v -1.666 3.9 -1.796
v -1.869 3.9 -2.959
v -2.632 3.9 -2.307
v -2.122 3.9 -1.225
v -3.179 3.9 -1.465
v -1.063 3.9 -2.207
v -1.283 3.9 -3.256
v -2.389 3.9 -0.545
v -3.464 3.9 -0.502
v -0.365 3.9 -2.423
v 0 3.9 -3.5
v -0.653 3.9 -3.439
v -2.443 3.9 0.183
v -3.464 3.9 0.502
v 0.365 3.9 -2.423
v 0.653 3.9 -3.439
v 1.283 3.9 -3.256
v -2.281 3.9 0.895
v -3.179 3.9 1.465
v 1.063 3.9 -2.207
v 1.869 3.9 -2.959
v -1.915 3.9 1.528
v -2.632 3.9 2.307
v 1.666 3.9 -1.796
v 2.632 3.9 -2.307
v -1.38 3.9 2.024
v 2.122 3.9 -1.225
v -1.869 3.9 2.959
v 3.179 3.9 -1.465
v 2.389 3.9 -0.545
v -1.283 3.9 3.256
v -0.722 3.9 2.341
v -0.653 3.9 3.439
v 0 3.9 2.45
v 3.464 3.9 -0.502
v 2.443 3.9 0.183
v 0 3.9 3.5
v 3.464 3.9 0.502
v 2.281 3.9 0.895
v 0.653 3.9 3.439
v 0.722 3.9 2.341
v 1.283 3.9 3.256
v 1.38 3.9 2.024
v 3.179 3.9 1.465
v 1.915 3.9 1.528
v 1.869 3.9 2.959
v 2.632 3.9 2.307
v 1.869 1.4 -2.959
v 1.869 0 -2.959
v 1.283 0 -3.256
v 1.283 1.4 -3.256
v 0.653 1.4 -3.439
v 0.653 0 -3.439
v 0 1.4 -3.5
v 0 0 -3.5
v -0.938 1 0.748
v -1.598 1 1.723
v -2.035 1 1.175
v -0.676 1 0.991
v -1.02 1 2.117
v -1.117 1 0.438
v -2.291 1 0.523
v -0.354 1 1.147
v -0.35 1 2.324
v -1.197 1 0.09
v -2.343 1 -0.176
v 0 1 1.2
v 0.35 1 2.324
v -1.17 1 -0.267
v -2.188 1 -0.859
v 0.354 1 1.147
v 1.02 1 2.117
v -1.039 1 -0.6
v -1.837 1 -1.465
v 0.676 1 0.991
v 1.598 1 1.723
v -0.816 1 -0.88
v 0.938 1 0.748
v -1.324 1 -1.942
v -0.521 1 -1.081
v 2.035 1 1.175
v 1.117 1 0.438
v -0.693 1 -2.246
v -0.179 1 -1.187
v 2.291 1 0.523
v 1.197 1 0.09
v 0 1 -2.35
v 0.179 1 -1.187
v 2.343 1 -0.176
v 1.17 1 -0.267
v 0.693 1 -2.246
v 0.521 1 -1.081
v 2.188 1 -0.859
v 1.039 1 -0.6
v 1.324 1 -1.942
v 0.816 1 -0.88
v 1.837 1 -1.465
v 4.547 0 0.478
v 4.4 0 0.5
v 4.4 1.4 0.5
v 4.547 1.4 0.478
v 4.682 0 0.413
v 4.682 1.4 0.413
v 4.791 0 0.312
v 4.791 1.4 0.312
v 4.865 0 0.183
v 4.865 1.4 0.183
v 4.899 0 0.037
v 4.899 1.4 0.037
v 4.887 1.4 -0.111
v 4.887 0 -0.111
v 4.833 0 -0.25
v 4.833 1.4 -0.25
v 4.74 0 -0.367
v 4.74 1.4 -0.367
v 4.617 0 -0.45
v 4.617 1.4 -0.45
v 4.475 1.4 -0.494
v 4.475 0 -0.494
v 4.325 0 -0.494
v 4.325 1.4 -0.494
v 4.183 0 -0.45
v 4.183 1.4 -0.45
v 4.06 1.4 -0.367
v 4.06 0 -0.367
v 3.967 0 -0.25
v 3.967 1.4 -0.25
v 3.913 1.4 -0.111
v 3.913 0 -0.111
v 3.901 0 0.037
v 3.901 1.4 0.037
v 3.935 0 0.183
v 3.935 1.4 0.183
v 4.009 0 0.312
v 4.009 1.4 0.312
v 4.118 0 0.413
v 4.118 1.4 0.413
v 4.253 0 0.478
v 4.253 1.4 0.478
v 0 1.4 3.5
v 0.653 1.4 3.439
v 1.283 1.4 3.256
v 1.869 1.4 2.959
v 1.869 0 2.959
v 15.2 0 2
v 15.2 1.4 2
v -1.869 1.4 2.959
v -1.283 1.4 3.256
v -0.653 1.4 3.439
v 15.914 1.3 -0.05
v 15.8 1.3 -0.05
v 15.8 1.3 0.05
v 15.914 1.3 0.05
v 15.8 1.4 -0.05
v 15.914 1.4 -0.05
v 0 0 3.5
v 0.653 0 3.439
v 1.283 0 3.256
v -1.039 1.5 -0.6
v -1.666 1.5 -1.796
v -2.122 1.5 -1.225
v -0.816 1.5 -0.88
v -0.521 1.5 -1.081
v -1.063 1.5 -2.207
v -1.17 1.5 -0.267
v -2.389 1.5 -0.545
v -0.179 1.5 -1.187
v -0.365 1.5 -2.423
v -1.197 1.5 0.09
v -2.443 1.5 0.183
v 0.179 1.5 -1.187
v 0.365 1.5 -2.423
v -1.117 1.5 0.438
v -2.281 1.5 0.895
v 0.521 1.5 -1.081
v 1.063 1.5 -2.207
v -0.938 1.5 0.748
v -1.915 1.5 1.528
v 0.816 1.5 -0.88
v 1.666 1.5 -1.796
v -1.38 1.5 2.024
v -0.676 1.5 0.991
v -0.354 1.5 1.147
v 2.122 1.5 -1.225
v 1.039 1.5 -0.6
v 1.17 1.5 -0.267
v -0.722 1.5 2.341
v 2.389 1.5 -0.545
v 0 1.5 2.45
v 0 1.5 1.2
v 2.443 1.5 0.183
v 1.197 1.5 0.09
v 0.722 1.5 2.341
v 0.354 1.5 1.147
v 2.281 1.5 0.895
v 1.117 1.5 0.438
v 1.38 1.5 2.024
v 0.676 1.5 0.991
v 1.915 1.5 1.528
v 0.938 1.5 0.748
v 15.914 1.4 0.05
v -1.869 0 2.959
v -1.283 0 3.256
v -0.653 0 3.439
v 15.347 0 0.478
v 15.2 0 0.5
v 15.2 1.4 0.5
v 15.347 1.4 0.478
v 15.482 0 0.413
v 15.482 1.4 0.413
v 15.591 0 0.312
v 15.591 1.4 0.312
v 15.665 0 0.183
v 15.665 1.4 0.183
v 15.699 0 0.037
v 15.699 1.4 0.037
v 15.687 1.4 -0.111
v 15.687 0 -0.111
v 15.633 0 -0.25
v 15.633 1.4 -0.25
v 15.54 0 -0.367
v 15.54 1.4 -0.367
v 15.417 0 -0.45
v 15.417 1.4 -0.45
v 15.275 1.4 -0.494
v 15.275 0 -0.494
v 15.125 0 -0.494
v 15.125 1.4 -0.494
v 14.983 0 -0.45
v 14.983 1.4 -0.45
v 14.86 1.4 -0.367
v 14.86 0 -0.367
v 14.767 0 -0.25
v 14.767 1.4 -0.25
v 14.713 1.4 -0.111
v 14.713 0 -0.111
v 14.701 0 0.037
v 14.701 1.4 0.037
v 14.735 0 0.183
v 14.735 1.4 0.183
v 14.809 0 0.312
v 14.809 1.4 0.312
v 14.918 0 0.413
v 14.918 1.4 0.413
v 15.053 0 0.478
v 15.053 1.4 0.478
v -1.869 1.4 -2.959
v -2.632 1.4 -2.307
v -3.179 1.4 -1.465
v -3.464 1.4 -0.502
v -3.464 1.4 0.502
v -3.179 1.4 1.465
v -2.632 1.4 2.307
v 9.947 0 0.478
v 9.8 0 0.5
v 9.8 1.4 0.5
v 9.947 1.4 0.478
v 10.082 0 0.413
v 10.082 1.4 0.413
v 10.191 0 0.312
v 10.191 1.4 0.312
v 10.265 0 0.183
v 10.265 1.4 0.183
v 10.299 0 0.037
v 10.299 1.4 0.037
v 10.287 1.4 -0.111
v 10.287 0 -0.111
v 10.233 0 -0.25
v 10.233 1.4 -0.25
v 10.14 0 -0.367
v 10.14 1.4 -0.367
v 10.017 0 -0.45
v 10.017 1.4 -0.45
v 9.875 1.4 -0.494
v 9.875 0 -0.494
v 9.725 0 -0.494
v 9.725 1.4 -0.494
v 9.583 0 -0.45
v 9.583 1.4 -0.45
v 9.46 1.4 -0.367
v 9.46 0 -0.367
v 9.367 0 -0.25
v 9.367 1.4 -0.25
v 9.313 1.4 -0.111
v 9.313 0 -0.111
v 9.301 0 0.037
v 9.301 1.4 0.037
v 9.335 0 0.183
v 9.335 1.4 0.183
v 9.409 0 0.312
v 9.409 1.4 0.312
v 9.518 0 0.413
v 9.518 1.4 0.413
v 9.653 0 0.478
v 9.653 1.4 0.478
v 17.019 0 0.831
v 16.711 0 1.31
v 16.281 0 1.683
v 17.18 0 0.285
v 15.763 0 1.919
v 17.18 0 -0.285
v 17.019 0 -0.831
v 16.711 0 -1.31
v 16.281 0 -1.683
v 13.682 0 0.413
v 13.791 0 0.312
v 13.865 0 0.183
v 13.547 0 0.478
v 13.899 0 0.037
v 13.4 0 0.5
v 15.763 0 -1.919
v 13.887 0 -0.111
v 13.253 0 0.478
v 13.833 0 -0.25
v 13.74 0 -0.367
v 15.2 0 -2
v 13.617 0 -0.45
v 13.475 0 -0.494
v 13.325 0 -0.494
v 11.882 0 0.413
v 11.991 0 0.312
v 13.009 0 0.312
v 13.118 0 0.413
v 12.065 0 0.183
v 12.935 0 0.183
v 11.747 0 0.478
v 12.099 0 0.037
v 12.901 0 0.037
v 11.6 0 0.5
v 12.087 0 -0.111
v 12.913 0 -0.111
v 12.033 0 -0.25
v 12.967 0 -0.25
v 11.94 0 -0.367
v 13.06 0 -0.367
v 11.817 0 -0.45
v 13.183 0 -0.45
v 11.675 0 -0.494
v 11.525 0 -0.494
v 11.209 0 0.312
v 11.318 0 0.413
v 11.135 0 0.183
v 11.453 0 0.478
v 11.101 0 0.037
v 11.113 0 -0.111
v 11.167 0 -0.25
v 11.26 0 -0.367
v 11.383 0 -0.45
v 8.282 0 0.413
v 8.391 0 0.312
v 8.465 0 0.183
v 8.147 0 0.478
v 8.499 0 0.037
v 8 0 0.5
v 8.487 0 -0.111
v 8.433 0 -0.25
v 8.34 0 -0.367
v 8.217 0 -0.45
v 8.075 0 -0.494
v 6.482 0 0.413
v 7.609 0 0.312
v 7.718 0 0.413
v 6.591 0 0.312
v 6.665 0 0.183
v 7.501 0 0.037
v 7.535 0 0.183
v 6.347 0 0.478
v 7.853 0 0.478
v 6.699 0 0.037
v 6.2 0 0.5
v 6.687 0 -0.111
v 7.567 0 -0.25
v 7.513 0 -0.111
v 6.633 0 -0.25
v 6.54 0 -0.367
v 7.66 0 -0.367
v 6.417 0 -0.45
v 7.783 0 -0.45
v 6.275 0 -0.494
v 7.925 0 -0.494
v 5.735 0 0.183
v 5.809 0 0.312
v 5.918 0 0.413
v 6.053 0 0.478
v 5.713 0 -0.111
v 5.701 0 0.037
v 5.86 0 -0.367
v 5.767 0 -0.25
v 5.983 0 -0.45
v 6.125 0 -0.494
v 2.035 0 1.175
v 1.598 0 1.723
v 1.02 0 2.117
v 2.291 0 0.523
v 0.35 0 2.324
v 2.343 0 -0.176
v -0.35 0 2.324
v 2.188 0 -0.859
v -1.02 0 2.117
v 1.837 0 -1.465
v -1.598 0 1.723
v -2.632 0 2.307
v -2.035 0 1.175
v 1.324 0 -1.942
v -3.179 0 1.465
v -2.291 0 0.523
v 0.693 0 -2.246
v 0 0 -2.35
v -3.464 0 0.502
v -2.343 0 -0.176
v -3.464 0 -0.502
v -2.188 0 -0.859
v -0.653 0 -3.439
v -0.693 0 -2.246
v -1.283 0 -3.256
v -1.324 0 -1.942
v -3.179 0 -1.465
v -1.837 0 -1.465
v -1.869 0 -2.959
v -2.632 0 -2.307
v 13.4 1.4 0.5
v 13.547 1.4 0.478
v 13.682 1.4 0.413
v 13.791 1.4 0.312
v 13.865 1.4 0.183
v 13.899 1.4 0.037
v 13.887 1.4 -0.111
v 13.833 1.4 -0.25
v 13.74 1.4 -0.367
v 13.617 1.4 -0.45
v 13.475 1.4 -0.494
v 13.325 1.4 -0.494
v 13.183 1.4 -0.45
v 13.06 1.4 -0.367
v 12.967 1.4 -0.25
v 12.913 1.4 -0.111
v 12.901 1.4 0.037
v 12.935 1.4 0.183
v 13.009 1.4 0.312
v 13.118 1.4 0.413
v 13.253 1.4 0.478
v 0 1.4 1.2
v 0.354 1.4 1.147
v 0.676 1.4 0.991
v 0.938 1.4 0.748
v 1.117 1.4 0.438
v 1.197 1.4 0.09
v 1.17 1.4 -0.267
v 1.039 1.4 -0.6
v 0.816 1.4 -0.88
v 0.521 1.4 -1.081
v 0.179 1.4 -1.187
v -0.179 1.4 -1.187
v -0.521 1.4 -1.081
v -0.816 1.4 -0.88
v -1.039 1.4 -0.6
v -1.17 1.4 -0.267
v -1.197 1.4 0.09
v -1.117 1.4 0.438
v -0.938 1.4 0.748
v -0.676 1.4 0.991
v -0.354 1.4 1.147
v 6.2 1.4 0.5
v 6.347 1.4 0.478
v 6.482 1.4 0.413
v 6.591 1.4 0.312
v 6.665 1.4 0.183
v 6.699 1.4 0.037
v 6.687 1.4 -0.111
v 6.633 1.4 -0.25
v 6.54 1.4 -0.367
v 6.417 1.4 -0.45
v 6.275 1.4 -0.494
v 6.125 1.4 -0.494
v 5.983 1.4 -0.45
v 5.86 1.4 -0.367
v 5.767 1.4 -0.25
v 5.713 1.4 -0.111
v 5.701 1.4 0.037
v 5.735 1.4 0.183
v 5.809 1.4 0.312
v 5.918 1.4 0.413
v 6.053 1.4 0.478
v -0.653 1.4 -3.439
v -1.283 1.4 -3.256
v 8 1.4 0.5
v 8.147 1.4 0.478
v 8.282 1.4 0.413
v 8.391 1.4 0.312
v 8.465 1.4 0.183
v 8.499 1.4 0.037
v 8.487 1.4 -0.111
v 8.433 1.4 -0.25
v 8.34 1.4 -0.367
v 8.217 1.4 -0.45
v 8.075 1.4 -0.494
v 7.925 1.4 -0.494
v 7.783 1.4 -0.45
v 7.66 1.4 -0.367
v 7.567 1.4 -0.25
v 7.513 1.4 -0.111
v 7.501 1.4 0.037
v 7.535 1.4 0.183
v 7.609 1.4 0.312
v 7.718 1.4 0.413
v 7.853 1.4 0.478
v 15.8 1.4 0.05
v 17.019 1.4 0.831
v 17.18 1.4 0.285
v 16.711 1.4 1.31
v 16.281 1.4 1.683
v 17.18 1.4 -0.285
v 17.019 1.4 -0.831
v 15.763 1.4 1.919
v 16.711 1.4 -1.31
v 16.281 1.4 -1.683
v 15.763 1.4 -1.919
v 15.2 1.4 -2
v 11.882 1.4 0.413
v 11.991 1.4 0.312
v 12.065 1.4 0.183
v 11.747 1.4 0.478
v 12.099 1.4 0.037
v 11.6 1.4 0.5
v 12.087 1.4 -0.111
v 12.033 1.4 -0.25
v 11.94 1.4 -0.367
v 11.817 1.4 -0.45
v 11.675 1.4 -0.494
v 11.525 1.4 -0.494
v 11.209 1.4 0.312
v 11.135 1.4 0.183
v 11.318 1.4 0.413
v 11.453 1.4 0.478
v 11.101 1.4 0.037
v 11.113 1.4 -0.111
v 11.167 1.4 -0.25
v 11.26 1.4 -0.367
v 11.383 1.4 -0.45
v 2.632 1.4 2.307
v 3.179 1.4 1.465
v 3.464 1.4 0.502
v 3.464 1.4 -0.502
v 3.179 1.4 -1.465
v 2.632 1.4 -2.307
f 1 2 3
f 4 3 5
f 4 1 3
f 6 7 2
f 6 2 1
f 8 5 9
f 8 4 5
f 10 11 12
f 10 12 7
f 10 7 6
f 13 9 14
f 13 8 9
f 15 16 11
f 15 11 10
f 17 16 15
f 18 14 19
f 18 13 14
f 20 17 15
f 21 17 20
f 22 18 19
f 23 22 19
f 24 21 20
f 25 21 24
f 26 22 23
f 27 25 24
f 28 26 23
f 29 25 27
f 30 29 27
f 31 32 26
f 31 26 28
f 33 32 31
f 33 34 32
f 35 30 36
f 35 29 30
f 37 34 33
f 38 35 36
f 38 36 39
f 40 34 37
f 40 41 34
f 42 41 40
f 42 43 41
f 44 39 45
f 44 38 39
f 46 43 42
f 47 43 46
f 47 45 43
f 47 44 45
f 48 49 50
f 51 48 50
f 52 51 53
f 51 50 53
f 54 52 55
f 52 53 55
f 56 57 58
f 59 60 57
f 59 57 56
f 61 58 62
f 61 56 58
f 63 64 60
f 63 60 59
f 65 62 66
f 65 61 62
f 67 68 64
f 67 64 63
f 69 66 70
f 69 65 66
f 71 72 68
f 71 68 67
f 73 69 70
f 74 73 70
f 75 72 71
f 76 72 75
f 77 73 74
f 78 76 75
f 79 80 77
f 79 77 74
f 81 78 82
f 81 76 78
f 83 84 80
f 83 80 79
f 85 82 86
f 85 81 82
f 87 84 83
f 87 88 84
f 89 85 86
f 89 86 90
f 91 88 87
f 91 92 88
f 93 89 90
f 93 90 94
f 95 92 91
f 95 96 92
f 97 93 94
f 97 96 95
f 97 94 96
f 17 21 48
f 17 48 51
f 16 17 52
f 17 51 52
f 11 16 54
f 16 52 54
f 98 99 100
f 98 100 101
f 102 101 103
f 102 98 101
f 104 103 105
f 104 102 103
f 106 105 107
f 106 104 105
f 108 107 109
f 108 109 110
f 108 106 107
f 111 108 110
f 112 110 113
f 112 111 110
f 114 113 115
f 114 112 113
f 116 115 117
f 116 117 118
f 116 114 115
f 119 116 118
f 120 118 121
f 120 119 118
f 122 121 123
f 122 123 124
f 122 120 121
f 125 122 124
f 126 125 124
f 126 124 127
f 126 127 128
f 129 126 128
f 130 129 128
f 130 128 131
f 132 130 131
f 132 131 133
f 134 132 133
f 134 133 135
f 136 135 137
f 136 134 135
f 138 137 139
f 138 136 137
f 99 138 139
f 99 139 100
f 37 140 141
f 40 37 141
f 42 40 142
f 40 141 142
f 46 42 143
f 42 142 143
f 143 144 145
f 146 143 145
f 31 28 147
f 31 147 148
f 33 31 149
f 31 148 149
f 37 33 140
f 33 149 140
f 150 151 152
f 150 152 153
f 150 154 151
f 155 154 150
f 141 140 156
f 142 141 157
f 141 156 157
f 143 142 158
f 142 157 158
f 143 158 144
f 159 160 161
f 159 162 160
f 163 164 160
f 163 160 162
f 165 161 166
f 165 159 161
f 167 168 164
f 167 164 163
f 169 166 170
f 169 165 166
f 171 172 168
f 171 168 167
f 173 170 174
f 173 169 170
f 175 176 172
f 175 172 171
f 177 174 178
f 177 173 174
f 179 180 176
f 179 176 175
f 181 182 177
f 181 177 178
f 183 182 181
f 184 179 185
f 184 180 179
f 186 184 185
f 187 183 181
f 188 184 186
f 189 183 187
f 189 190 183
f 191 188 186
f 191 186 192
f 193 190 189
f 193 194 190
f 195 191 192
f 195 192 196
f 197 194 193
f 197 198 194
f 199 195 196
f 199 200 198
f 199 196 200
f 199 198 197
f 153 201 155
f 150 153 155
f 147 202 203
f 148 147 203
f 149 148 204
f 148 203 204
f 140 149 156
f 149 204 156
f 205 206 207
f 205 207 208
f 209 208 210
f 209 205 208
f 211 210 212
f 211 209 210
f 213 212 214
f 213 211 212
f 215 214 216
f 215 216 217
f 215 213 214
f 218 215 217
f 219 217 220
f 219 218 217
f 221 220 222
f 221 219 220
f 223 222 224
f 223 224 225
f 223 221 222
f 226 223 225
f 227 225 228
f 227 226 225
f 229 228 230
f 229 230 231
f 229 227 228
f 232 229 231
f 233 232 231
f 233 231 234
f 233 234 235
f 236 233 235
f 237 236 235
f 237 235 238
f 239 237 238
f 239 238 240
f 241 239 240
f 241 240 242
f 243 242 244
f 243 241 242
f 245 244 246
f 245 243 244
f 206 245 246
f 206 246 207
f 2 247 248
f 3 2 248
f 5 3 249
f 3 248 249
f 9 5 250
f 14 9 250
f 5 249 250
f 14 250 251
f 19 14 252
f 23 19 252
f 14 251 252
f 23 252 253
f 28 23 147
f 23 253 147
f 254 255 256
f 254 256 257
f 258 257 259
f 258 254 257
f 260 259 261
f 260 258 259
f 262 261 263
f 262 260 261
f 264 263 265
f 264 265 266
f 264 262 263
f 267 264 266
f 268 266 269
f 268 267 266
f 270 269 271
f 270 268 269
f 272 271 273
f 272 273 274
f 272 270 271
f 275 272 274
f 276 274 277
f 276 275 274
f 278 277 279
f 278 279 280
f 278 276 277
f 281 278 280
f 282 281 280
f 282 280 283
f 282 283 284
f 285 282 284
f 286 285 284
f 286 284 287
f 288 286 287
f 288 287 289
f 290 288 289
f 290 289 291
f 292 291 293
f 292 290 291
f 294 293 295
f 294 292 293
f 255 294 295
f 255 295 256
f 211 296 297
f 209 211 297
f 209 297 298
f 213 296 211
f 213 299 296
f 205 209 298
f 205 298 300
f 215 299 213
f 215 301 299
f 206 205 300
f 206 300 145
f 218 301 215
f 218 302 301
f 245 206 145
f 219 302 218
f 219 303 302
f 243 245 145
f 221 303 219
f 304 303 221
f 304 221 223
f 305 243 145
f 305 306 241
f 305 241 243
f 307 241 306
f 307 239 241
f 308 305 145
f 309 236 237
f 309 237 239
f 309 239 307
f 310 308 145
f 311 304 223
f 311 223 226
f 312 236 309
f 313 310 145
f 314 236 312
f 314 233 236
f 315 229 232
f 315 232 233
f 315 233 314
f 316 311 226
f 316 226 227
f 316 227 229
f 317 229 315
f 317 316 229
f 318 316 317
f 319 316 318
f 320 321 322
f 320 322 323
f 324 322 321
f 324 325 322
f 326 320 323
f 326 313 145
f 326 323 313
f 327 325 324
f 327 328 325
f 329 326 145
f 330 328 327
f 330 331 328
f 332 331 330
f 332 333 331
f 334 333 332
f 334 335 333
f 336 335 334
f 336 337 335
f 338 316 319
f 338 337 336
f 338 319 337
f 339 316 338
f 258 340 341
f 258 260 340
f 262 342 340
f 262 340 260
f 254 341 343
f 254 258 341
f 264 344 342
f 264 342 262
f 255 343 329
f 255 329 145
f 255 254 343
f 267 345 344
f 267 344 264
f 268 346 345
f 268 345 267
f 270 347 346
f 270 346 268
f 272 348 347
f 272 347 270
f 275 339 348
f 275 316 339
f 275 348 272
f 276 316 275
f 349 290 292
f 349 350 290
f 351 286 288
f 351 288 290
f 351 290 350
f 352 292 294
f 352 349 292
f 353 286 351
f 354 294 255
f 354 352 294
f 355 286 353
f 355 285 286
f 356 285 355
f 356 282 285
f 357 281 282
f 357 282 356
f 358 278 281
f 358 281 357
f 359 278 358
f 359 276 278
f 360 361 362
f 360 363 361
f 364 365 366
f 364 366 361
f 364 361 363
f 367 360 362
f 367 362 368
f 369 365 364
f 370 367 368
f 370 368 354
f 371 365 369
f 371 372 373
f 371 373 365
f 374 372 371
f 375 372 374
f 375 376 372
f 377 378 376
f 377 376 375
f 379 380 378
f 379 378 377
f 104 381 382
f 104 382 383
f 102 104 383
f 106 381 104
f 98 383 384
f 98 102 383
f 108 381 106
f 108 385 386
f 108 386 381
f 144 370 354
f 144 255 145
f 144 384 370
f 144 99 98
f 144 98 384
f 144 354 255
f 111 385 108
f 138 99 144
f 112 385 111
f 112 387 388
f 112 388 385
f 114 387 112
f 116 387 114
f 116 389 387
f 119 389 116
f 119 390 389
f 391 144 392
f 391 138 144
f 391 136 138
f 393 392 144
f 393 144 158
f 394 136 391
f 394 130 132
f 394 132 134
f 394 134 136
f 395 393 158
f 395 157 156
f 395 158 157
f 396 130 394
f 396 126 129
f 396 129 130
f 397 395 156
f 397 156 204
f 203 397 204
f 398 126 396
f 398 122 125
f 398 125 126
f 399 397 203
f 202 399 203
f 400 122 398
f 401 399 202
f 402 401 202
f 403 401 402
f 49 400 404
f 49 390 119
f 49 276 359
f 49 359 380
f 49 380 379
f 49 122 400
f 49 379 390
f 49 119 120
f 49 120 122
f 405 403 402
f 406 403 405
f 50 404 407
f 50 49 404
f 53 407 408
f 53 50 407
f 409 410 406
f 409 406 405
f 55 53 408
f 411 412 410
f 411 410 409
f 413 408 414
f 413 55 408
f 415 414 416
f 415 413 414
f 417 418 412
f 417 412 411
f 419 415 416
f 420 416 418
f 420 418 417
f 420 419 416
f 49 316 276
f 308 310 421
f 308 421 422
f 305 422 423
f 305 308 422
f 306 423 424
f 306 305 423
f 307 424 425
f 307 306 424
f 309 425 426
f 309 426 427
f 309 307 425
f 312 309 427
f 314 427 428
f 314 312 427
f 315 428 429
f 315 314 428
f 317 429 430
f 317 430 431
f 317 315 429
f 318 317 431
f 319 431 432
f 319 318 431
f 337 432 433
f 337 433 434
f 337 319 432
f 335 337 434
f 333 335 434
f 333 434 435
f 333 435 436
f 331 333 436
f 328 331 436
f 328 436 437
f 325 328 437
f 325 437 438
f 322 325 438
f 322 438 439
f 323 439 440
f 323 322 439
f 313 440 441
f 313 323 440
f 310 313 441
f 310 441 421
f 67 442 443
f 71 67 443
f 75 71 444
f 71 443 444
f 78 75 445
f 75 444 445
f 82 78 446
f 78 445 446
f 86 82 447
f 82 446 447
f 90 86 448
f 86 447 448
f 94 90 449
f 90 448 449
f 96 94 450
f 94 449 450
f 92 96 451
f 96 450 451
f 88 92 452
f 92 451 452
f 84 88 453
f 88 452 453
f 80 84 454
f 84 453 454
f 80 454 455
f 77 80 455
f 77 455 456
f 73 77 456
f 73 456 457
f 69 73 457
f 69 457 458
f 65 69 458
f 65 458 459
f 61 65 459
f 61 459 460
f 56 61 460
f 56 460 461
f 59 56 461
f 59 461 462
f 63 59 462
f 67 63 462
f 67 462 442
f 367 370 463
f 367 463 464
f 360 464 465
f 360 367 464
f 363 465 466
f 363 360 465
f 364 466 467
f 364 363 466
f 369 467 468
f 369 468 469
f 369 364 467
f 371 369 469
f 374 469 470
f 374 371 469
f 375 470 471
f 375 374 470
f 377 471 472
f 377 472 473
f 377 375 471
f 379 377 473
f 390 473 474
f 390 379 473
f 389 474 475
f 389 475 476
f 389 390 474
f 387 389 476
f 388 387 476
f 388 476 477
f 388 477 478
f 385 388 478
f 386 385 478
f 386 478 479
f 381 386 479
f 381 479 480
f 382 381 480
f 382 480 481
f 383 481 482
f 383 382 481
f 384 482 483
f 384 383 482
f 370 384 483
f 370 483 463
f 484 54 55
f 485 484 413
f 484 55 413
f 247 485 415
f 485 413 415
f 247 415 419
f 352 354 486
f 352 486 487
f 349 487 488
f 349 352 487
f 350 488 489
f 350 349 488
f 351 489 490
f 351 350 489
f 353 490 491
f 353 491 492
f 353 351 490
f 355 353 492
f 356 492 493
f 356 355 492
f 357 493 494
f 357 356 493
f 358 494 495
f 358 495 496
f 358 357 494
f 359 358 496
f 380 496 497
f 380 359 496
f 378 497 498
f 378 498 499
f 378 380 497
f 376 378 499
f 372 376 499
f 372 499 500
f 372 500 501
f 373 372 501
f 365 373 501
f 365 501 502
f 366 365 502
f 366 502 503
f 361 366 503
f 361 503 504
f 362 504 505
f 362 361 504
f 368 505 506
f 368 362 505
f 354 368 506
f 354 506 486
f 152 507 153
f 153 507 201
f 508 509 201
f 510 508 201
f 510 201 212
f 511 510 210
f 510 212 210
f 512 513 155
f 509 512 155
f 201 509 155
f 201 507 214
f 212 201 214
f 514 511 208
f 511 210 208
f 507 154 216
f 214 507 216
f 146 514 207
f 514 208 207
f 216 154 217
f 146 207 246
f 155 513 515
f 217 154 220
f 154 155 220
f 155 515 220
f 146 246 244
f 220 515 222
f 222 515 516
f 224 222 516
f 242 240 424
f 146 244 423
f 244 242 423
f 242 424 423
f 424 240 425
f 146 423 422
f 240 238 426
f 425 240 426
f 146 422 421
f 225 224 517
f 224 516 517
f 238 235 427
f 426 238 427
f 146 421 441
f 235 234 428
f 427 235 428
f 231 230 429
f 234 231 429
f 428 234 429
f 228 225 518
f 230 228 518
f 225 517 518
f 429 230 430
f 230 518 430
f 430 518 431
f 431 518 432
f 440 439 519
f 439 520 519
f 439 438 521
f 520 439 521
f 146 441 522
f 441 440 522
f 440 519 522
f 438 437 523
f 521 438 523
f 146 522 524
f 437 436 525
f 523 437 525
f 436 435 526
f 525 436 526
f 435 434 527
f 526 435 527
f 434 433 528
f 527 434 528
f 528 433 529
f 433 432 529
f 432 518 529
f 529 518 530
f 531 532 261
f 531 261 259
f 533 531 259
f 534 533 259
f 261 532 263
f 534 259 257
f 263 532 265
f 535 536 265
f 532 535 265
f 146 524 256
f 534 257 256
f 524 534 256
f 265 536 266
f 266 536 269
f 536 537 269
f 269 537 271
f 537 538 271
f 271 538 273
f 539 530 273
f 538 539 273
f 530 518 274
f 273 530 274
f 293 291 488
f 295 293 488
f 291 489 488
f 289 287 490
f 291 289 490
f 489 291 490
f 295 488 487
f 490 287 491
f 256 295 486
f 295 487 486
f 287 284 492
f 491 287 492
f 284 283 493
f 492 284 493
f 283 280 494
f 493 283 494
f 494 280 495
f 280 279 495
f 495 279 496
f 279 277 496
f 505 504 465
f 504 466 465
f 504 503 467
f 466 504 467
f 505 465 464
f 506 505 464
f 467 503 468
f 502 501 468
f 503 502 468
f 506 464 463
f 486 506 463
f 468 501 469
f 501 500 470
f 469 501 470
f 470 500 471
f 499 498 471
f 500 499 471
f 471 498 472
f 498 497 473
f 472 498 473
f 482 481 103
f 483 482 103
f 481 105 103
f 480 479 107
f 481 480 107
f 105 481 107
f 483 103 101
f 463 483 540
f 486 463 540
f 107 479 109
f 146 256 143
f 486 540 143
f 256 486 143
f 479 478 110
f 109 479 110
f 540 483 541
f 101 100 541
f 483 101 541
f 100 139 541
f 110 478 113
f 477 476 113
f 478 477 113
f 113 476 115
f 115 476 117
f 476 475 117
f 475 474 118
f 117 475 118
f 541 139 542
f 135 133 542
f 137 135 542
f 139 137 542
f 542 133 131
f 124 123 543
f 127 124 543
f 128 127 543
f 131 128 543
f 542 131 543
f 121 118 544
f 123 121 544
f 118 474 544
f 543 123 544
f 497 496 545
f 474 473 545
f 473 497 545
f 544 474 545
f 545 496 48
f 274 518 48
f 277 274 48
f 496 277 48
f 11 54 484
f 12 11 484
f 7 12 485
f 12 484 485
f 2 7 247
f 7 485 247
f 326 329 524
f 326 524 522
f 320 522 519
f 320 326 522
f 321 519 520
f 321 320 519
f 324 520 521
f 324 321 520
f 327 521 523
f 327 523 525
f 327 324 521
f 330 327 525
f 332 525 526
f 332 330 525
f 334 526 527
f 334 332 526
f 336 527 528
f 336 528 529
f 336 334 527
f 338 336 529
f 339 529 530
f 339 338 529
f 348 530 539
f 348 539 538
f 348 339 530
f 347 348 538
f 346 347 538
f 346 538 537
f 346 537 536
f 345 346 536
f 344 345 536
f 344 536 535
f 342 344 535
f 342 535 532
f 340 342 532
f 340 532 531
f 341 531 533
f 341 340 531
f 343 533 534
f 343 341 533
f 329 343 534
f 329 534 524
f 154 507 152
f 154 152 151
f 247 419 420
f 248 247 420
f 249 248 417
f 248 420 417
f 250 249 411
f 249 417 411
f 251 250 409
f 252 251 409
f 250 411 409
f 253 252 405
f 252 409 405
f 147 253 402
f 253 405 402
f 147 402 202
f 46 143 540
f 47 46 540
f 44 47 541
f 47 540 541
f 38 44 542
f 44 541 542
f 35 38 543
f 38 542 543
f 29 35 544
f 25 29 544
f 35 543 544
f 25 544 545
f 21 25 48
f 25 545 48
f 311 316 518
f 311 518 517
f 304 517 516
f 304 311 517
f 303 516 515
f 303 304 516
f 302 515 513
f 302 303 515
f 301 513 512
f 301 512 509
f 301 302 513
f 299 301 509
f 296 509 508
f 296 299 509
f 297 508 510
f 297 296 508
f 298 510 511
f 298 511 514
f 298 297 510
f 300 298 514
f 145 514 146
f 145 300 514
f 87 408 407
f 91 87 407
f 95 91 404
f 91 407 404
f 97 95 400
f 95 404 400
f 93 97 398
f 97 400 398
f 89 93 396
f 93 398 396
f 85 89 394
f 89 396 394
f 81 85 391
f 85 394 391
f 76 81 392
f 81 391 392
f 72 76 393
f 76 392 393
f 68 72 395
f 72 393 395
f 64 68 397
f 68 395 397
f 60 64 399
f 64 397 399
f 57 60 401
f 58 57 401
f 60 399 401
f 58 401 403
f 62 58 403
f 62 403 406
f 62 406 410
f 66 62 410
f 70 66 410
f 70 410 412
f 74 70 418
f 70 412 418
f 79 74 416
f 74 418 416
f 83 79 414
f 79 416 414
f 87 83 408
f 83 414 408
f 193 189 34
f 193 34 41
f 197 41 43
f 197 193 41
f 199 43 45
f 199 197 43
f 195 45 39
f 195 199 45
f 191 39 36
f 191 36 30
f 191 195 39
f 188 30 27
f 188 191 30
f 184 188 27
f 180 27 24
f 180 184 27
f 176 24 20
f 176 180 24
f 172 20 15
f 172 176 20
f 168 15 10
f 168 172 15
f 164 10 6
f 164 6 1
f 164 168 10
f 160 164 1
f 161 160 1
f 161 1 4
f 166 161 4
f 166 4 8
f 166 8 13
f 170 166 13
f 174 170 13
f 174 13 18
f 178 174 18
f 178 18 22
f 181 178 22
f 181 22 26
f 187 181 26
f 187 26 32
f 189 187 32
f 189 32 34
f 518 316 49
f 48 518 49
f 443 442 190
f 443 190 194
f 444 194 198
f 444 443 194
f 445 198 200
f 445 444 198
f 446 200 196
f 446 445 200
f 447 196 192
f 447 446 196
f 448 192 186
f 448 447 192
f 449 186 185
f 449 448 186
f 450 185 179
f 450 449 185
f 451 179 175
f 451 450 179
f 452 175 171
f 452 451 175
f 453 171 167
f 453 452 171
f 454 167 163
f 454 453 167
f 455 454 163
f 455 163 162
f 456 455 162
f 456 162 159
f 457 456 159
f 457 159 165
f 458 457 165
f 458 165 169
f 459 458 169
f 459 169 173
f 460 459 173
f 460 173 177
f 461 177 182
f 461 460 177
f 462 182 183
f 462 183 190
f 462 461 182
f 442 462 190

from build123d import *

# Parameters (mm, degrees)
SKETCH1_R           = 0.5
BOSS_EXTRUDE1_DEPTH = 1.4
SKETCH2_R           = 2.35
CUT_EXTRUDE1_DEPTH  = 1
SKETCH3_R           = 3.5
SKETCH3_R_2         = 2.45
BOSS_EXTRUDE2_DEPTH = 2.5
SKETCH4_R           = 1.2
CUT_EXTRUDE2_DEPTH  = 20.282440198
SKETCH5_R           = 2.45
SKETCH5_R_2         = 1.2
BOSS_EXTRUDE3_DEPTH = 0.1
SKETCH6_W           = 35.735260114
SKETCH6_H           = 17.672039004
CUT_EXTRUDE4_DEPTH  = 20.513392837
CUT_EXTRUDE5_DEPTH  = 18.980545042
SKETCH8_W           = 0.114102852
SKETCH8_H           = 0.1
CUT_EXTRUDE6_DEPTH  = 0.1


with BuildPart() as part:
    # Sketch1 → Boss-Extrude1 (new body)
    with BuildSketch(Plane(origin=(0, 0, 0), x_dir=(1, 0, 0), z_dir=(0, 1, 0))):
        with BuildLine():
            Line((-15.2, 2), (-2, 2.95))
            Line((-2, 2.95), (-2, 6.35))
            ThreePointArc((-2, 6.35), (0, 8.35), (2, 6.35))
            Line((2, 6.35), (2, 3.5))
            Line((2, 3.5), (15.2, 2))
            ThreePointArc((15.2, 2), (17.2, 0), (15.2, -2))
            Line((15.2, -2), (2, -3.5))
            Line((2, -3.5), (2, -6.35))
            ThreePointArc((2, -6.35), (0, -8.35), (-2, -6.35))
            Line((-2, -6.35), (-2, -2.95))
            Line((-2, -2.95), (-15.2, -2))
            ThreePointArc((-15.2, -2), (-17.2, 0), (-15.2, 2))
        make_face()
        with Locations(Location((0, 6.35, 0), (0, 0, 270))):
            Circle(SKETCH1_R, mode=Mode.SUBTRACT)
        with Locations(Location((0, 4.55, 0), (0, 0, 270))):
            Circle(SKETCH1_R, mode=Mode.SUBTRACT)
        with Locations(Location((0, -4.55, 0), (0, 0, 90))):
            Circle(SKETCH1_R, mode=Mode.SUBTRACT)
        with Locations(Location((0, -6.35, 0), (0, 0, 90))):
            Circle(SKETCH1_R, mode=Mode.SUBTRACT)
        with Locations(Location((-15.2, 0, 0), (0, 0, 270))):
            Circle(SKETCH1_R, mode=Mode.SUBTRACT)
        with Locations(Location((15.2, 0, 0), (0, 0, 270))):
            Circle(SKETCH1_R, mode=Mode.SUBTRACT)
        with Locations(Location((-13.4, 0, 0), (0, 0, 270))):
            Circle(SKETCH1_R, mode=Mode.SUBTRACT)
        with Locations(Location((-11.6, 0, 0), (0, 0, 270))):
            Circle(SKETCH1_R, mode=Mode.SUBTRACT)
        with Locations(Location((-9.8, 0, 0), (0, 0, 270))):
            Circle(SKETCH1_R, mode=Mode.SUBTRACT)
        with Locations(Location((-8, 0, 0), (0, 0, 270))):
            Circle(SKETCH1_R, mode=Mode.SUBTRACT)
        with Locations(Location((-6.2, 0, 0), (0, 0, 270))):
            Circle(SKETCH1_R, mode=Mode.SUBTRACT)
        with Locations(Location((-4.4, 0, 0), (0, 0, 270))):
            Circle(SKETCH1_R, mode=Mode.SUBTRACT)
        with Locations(Location((13.4, 0, 0), (0, 0, 270))):
            Circle(SKETCH1_R, mode=Mode.SUBTRACT)
        with Locations(Location((11.6, 0, 0), (0, 0, 270))):
            Circle(SKETCH1_R, mode=Mode.SUBTRACT)
        with Locations(Location((9.8, 0, 0), (0, 0, 270))):
            Circle(SKETCH1_R, mode=Mode.SUBTRACT)
        with Locations(Location((8, 0, 0), (0, 0, 270))):
            Circle(SKETCH1_R, mode=Mode.SUBTRACT)
        with Locations(Location((6.2, 0, 0), (0, 0, 270))):
            Circle(SKETCH1_R, mode=Mode.SUBTRACT)
        with Locations(Location((4.4, 0, 0), (0, 0, 270))):
            Circle(SKETCH1_R, mode=Mode.SUBTRACT)
    extrude(amount=BOSS_EXTRUDE1_DEPTH)

    # Sketch2 → Cut-Extrude1 (cut)
    with BuildSketch(Plane.XZ):
        with Locations(Location((0, 0, 0), (0, 0, 270))):
            Circle(SKETCH2_R)
    extrude(amount=-CUT_EXTRUDE1_DEPTH, mode=Mode.SUBTRACT)

    # Sketch3 → Boss-Extrude2 (add)
    with BuildSketch(Plane(origin=(0, 1.4, 0), x_dir=(1, 0, 0), z_dir=(0, 1, 0))):
        with Locations(Location((0, 0, 0), (0, 0, 270))):
            Circle(SKETCH3_R)
        with Locations(Location((0, 0, 0), (0, 0, 270))):
            Circle(SKETCH3_R_2, mode=Mode.SUBTRACT)
    extrude(amount=BOSS_EXTRUDE2_DEPTH)

    # Sketch4 → Cut-Extrude2 (cut, through all)
    with BuildSketch(Plane(origin=(0, 1.4, 0), x_dir=(1, 0, 0), z_dir=(0, 1, 0))):
        with Locations(Location((0, 0, 0), (0, 0, 270))):
            Circle(SKETCH4_R)
    extrude(amount=-CUT_EXTRUDE2_DEPTH, mode=Mode.SUBTRACT)

    # Sketch5 → Boss-Extrude3 (add)
    with BuildSketch(Plane(origin=(0, 1.4, 0), x_dir=(1, 0, 0), z_dir=(0, 1, 0))):
        with Locations(Location((0, 0, 0), (0, 0, 270))):
            Circle(SKETCH5_R)
        with Locations(Location((0, 0, 0), (0, 0, 270))):
            Circle(SKETCH5_R_2, mode=Mode.SUBTRACT)
    extrude(amount=BOSS_EXTRUDE3_DEPTH)

    # Sketch6 → Cut-Extrude4 (cut, through all)
    with BuildSketch(Plane.XZ):
        Rectangle(SKETCH6_W, SKETCH6_H)
        with BuildLine():
            Line((-1.868584713, -2.959457918), (-15.2, -2))
            ThreePointArc((-15.2, -2), (-17.2, 0), (-15.2, 2))
            Line((-15.2, 2), (-1.868584713, 2.959457918))
            ThreePointArc((-1.868584713, 2.959457918), (0, 3.5), (1.868584713, 2.959457918))
            Line((1.868584713, 2.959457918), (15.2, 2))
            ThreePointArc((15.2, 2), (17.2, 0), (15.2, -2))
            Line((15.2, -2), (1.868584713, -2.959457918))
            ThreePointArc((1.868584713, -2.959457918), (0, -3.5), (-1.868584713, -2.959457918))
        make_face(mode=Mode.SUBTRACT)
    extrude(amount=-CUT_EXTRUDE4_DEPTH, mode=Mode.SUBTRACT)

    # Sketch7 → Cut-Extrude5 (cut, through all)
    with BuildSketch(Plane.XZ):
        with BuildLine():
            Line((0, 3.5), (-17.731768104, 3.5))
            Line((-17.731768104, 3.5), (-17.731768104, -3.5))
            Line((-17.731768104, -3.5), (0, -3.5))
            ThreePointArc((0, -3.5), (-3.5, 0), (0, 3.5))
        make_face()
    extrude(amount=-CUT_EXTRUDE5_DEPTH, mode=Mode.SUBTRACT)

    # Sketch8 → Cut-Extrude6 (cut)
    with BuildSketch(Plane(origin=(0, 1.4, 0), x_dir=(1, 0, 0), z_dir=(0, 1, 0))):
        with Locations((15.857051426, 0)):
            Rectangle(SKETCH8_W, SKETCH8_H)
    extrude(amount=-CUT_EXTRUDE6_DEPTH, mode=Mode.SUBTRACT)


solid = part.part
